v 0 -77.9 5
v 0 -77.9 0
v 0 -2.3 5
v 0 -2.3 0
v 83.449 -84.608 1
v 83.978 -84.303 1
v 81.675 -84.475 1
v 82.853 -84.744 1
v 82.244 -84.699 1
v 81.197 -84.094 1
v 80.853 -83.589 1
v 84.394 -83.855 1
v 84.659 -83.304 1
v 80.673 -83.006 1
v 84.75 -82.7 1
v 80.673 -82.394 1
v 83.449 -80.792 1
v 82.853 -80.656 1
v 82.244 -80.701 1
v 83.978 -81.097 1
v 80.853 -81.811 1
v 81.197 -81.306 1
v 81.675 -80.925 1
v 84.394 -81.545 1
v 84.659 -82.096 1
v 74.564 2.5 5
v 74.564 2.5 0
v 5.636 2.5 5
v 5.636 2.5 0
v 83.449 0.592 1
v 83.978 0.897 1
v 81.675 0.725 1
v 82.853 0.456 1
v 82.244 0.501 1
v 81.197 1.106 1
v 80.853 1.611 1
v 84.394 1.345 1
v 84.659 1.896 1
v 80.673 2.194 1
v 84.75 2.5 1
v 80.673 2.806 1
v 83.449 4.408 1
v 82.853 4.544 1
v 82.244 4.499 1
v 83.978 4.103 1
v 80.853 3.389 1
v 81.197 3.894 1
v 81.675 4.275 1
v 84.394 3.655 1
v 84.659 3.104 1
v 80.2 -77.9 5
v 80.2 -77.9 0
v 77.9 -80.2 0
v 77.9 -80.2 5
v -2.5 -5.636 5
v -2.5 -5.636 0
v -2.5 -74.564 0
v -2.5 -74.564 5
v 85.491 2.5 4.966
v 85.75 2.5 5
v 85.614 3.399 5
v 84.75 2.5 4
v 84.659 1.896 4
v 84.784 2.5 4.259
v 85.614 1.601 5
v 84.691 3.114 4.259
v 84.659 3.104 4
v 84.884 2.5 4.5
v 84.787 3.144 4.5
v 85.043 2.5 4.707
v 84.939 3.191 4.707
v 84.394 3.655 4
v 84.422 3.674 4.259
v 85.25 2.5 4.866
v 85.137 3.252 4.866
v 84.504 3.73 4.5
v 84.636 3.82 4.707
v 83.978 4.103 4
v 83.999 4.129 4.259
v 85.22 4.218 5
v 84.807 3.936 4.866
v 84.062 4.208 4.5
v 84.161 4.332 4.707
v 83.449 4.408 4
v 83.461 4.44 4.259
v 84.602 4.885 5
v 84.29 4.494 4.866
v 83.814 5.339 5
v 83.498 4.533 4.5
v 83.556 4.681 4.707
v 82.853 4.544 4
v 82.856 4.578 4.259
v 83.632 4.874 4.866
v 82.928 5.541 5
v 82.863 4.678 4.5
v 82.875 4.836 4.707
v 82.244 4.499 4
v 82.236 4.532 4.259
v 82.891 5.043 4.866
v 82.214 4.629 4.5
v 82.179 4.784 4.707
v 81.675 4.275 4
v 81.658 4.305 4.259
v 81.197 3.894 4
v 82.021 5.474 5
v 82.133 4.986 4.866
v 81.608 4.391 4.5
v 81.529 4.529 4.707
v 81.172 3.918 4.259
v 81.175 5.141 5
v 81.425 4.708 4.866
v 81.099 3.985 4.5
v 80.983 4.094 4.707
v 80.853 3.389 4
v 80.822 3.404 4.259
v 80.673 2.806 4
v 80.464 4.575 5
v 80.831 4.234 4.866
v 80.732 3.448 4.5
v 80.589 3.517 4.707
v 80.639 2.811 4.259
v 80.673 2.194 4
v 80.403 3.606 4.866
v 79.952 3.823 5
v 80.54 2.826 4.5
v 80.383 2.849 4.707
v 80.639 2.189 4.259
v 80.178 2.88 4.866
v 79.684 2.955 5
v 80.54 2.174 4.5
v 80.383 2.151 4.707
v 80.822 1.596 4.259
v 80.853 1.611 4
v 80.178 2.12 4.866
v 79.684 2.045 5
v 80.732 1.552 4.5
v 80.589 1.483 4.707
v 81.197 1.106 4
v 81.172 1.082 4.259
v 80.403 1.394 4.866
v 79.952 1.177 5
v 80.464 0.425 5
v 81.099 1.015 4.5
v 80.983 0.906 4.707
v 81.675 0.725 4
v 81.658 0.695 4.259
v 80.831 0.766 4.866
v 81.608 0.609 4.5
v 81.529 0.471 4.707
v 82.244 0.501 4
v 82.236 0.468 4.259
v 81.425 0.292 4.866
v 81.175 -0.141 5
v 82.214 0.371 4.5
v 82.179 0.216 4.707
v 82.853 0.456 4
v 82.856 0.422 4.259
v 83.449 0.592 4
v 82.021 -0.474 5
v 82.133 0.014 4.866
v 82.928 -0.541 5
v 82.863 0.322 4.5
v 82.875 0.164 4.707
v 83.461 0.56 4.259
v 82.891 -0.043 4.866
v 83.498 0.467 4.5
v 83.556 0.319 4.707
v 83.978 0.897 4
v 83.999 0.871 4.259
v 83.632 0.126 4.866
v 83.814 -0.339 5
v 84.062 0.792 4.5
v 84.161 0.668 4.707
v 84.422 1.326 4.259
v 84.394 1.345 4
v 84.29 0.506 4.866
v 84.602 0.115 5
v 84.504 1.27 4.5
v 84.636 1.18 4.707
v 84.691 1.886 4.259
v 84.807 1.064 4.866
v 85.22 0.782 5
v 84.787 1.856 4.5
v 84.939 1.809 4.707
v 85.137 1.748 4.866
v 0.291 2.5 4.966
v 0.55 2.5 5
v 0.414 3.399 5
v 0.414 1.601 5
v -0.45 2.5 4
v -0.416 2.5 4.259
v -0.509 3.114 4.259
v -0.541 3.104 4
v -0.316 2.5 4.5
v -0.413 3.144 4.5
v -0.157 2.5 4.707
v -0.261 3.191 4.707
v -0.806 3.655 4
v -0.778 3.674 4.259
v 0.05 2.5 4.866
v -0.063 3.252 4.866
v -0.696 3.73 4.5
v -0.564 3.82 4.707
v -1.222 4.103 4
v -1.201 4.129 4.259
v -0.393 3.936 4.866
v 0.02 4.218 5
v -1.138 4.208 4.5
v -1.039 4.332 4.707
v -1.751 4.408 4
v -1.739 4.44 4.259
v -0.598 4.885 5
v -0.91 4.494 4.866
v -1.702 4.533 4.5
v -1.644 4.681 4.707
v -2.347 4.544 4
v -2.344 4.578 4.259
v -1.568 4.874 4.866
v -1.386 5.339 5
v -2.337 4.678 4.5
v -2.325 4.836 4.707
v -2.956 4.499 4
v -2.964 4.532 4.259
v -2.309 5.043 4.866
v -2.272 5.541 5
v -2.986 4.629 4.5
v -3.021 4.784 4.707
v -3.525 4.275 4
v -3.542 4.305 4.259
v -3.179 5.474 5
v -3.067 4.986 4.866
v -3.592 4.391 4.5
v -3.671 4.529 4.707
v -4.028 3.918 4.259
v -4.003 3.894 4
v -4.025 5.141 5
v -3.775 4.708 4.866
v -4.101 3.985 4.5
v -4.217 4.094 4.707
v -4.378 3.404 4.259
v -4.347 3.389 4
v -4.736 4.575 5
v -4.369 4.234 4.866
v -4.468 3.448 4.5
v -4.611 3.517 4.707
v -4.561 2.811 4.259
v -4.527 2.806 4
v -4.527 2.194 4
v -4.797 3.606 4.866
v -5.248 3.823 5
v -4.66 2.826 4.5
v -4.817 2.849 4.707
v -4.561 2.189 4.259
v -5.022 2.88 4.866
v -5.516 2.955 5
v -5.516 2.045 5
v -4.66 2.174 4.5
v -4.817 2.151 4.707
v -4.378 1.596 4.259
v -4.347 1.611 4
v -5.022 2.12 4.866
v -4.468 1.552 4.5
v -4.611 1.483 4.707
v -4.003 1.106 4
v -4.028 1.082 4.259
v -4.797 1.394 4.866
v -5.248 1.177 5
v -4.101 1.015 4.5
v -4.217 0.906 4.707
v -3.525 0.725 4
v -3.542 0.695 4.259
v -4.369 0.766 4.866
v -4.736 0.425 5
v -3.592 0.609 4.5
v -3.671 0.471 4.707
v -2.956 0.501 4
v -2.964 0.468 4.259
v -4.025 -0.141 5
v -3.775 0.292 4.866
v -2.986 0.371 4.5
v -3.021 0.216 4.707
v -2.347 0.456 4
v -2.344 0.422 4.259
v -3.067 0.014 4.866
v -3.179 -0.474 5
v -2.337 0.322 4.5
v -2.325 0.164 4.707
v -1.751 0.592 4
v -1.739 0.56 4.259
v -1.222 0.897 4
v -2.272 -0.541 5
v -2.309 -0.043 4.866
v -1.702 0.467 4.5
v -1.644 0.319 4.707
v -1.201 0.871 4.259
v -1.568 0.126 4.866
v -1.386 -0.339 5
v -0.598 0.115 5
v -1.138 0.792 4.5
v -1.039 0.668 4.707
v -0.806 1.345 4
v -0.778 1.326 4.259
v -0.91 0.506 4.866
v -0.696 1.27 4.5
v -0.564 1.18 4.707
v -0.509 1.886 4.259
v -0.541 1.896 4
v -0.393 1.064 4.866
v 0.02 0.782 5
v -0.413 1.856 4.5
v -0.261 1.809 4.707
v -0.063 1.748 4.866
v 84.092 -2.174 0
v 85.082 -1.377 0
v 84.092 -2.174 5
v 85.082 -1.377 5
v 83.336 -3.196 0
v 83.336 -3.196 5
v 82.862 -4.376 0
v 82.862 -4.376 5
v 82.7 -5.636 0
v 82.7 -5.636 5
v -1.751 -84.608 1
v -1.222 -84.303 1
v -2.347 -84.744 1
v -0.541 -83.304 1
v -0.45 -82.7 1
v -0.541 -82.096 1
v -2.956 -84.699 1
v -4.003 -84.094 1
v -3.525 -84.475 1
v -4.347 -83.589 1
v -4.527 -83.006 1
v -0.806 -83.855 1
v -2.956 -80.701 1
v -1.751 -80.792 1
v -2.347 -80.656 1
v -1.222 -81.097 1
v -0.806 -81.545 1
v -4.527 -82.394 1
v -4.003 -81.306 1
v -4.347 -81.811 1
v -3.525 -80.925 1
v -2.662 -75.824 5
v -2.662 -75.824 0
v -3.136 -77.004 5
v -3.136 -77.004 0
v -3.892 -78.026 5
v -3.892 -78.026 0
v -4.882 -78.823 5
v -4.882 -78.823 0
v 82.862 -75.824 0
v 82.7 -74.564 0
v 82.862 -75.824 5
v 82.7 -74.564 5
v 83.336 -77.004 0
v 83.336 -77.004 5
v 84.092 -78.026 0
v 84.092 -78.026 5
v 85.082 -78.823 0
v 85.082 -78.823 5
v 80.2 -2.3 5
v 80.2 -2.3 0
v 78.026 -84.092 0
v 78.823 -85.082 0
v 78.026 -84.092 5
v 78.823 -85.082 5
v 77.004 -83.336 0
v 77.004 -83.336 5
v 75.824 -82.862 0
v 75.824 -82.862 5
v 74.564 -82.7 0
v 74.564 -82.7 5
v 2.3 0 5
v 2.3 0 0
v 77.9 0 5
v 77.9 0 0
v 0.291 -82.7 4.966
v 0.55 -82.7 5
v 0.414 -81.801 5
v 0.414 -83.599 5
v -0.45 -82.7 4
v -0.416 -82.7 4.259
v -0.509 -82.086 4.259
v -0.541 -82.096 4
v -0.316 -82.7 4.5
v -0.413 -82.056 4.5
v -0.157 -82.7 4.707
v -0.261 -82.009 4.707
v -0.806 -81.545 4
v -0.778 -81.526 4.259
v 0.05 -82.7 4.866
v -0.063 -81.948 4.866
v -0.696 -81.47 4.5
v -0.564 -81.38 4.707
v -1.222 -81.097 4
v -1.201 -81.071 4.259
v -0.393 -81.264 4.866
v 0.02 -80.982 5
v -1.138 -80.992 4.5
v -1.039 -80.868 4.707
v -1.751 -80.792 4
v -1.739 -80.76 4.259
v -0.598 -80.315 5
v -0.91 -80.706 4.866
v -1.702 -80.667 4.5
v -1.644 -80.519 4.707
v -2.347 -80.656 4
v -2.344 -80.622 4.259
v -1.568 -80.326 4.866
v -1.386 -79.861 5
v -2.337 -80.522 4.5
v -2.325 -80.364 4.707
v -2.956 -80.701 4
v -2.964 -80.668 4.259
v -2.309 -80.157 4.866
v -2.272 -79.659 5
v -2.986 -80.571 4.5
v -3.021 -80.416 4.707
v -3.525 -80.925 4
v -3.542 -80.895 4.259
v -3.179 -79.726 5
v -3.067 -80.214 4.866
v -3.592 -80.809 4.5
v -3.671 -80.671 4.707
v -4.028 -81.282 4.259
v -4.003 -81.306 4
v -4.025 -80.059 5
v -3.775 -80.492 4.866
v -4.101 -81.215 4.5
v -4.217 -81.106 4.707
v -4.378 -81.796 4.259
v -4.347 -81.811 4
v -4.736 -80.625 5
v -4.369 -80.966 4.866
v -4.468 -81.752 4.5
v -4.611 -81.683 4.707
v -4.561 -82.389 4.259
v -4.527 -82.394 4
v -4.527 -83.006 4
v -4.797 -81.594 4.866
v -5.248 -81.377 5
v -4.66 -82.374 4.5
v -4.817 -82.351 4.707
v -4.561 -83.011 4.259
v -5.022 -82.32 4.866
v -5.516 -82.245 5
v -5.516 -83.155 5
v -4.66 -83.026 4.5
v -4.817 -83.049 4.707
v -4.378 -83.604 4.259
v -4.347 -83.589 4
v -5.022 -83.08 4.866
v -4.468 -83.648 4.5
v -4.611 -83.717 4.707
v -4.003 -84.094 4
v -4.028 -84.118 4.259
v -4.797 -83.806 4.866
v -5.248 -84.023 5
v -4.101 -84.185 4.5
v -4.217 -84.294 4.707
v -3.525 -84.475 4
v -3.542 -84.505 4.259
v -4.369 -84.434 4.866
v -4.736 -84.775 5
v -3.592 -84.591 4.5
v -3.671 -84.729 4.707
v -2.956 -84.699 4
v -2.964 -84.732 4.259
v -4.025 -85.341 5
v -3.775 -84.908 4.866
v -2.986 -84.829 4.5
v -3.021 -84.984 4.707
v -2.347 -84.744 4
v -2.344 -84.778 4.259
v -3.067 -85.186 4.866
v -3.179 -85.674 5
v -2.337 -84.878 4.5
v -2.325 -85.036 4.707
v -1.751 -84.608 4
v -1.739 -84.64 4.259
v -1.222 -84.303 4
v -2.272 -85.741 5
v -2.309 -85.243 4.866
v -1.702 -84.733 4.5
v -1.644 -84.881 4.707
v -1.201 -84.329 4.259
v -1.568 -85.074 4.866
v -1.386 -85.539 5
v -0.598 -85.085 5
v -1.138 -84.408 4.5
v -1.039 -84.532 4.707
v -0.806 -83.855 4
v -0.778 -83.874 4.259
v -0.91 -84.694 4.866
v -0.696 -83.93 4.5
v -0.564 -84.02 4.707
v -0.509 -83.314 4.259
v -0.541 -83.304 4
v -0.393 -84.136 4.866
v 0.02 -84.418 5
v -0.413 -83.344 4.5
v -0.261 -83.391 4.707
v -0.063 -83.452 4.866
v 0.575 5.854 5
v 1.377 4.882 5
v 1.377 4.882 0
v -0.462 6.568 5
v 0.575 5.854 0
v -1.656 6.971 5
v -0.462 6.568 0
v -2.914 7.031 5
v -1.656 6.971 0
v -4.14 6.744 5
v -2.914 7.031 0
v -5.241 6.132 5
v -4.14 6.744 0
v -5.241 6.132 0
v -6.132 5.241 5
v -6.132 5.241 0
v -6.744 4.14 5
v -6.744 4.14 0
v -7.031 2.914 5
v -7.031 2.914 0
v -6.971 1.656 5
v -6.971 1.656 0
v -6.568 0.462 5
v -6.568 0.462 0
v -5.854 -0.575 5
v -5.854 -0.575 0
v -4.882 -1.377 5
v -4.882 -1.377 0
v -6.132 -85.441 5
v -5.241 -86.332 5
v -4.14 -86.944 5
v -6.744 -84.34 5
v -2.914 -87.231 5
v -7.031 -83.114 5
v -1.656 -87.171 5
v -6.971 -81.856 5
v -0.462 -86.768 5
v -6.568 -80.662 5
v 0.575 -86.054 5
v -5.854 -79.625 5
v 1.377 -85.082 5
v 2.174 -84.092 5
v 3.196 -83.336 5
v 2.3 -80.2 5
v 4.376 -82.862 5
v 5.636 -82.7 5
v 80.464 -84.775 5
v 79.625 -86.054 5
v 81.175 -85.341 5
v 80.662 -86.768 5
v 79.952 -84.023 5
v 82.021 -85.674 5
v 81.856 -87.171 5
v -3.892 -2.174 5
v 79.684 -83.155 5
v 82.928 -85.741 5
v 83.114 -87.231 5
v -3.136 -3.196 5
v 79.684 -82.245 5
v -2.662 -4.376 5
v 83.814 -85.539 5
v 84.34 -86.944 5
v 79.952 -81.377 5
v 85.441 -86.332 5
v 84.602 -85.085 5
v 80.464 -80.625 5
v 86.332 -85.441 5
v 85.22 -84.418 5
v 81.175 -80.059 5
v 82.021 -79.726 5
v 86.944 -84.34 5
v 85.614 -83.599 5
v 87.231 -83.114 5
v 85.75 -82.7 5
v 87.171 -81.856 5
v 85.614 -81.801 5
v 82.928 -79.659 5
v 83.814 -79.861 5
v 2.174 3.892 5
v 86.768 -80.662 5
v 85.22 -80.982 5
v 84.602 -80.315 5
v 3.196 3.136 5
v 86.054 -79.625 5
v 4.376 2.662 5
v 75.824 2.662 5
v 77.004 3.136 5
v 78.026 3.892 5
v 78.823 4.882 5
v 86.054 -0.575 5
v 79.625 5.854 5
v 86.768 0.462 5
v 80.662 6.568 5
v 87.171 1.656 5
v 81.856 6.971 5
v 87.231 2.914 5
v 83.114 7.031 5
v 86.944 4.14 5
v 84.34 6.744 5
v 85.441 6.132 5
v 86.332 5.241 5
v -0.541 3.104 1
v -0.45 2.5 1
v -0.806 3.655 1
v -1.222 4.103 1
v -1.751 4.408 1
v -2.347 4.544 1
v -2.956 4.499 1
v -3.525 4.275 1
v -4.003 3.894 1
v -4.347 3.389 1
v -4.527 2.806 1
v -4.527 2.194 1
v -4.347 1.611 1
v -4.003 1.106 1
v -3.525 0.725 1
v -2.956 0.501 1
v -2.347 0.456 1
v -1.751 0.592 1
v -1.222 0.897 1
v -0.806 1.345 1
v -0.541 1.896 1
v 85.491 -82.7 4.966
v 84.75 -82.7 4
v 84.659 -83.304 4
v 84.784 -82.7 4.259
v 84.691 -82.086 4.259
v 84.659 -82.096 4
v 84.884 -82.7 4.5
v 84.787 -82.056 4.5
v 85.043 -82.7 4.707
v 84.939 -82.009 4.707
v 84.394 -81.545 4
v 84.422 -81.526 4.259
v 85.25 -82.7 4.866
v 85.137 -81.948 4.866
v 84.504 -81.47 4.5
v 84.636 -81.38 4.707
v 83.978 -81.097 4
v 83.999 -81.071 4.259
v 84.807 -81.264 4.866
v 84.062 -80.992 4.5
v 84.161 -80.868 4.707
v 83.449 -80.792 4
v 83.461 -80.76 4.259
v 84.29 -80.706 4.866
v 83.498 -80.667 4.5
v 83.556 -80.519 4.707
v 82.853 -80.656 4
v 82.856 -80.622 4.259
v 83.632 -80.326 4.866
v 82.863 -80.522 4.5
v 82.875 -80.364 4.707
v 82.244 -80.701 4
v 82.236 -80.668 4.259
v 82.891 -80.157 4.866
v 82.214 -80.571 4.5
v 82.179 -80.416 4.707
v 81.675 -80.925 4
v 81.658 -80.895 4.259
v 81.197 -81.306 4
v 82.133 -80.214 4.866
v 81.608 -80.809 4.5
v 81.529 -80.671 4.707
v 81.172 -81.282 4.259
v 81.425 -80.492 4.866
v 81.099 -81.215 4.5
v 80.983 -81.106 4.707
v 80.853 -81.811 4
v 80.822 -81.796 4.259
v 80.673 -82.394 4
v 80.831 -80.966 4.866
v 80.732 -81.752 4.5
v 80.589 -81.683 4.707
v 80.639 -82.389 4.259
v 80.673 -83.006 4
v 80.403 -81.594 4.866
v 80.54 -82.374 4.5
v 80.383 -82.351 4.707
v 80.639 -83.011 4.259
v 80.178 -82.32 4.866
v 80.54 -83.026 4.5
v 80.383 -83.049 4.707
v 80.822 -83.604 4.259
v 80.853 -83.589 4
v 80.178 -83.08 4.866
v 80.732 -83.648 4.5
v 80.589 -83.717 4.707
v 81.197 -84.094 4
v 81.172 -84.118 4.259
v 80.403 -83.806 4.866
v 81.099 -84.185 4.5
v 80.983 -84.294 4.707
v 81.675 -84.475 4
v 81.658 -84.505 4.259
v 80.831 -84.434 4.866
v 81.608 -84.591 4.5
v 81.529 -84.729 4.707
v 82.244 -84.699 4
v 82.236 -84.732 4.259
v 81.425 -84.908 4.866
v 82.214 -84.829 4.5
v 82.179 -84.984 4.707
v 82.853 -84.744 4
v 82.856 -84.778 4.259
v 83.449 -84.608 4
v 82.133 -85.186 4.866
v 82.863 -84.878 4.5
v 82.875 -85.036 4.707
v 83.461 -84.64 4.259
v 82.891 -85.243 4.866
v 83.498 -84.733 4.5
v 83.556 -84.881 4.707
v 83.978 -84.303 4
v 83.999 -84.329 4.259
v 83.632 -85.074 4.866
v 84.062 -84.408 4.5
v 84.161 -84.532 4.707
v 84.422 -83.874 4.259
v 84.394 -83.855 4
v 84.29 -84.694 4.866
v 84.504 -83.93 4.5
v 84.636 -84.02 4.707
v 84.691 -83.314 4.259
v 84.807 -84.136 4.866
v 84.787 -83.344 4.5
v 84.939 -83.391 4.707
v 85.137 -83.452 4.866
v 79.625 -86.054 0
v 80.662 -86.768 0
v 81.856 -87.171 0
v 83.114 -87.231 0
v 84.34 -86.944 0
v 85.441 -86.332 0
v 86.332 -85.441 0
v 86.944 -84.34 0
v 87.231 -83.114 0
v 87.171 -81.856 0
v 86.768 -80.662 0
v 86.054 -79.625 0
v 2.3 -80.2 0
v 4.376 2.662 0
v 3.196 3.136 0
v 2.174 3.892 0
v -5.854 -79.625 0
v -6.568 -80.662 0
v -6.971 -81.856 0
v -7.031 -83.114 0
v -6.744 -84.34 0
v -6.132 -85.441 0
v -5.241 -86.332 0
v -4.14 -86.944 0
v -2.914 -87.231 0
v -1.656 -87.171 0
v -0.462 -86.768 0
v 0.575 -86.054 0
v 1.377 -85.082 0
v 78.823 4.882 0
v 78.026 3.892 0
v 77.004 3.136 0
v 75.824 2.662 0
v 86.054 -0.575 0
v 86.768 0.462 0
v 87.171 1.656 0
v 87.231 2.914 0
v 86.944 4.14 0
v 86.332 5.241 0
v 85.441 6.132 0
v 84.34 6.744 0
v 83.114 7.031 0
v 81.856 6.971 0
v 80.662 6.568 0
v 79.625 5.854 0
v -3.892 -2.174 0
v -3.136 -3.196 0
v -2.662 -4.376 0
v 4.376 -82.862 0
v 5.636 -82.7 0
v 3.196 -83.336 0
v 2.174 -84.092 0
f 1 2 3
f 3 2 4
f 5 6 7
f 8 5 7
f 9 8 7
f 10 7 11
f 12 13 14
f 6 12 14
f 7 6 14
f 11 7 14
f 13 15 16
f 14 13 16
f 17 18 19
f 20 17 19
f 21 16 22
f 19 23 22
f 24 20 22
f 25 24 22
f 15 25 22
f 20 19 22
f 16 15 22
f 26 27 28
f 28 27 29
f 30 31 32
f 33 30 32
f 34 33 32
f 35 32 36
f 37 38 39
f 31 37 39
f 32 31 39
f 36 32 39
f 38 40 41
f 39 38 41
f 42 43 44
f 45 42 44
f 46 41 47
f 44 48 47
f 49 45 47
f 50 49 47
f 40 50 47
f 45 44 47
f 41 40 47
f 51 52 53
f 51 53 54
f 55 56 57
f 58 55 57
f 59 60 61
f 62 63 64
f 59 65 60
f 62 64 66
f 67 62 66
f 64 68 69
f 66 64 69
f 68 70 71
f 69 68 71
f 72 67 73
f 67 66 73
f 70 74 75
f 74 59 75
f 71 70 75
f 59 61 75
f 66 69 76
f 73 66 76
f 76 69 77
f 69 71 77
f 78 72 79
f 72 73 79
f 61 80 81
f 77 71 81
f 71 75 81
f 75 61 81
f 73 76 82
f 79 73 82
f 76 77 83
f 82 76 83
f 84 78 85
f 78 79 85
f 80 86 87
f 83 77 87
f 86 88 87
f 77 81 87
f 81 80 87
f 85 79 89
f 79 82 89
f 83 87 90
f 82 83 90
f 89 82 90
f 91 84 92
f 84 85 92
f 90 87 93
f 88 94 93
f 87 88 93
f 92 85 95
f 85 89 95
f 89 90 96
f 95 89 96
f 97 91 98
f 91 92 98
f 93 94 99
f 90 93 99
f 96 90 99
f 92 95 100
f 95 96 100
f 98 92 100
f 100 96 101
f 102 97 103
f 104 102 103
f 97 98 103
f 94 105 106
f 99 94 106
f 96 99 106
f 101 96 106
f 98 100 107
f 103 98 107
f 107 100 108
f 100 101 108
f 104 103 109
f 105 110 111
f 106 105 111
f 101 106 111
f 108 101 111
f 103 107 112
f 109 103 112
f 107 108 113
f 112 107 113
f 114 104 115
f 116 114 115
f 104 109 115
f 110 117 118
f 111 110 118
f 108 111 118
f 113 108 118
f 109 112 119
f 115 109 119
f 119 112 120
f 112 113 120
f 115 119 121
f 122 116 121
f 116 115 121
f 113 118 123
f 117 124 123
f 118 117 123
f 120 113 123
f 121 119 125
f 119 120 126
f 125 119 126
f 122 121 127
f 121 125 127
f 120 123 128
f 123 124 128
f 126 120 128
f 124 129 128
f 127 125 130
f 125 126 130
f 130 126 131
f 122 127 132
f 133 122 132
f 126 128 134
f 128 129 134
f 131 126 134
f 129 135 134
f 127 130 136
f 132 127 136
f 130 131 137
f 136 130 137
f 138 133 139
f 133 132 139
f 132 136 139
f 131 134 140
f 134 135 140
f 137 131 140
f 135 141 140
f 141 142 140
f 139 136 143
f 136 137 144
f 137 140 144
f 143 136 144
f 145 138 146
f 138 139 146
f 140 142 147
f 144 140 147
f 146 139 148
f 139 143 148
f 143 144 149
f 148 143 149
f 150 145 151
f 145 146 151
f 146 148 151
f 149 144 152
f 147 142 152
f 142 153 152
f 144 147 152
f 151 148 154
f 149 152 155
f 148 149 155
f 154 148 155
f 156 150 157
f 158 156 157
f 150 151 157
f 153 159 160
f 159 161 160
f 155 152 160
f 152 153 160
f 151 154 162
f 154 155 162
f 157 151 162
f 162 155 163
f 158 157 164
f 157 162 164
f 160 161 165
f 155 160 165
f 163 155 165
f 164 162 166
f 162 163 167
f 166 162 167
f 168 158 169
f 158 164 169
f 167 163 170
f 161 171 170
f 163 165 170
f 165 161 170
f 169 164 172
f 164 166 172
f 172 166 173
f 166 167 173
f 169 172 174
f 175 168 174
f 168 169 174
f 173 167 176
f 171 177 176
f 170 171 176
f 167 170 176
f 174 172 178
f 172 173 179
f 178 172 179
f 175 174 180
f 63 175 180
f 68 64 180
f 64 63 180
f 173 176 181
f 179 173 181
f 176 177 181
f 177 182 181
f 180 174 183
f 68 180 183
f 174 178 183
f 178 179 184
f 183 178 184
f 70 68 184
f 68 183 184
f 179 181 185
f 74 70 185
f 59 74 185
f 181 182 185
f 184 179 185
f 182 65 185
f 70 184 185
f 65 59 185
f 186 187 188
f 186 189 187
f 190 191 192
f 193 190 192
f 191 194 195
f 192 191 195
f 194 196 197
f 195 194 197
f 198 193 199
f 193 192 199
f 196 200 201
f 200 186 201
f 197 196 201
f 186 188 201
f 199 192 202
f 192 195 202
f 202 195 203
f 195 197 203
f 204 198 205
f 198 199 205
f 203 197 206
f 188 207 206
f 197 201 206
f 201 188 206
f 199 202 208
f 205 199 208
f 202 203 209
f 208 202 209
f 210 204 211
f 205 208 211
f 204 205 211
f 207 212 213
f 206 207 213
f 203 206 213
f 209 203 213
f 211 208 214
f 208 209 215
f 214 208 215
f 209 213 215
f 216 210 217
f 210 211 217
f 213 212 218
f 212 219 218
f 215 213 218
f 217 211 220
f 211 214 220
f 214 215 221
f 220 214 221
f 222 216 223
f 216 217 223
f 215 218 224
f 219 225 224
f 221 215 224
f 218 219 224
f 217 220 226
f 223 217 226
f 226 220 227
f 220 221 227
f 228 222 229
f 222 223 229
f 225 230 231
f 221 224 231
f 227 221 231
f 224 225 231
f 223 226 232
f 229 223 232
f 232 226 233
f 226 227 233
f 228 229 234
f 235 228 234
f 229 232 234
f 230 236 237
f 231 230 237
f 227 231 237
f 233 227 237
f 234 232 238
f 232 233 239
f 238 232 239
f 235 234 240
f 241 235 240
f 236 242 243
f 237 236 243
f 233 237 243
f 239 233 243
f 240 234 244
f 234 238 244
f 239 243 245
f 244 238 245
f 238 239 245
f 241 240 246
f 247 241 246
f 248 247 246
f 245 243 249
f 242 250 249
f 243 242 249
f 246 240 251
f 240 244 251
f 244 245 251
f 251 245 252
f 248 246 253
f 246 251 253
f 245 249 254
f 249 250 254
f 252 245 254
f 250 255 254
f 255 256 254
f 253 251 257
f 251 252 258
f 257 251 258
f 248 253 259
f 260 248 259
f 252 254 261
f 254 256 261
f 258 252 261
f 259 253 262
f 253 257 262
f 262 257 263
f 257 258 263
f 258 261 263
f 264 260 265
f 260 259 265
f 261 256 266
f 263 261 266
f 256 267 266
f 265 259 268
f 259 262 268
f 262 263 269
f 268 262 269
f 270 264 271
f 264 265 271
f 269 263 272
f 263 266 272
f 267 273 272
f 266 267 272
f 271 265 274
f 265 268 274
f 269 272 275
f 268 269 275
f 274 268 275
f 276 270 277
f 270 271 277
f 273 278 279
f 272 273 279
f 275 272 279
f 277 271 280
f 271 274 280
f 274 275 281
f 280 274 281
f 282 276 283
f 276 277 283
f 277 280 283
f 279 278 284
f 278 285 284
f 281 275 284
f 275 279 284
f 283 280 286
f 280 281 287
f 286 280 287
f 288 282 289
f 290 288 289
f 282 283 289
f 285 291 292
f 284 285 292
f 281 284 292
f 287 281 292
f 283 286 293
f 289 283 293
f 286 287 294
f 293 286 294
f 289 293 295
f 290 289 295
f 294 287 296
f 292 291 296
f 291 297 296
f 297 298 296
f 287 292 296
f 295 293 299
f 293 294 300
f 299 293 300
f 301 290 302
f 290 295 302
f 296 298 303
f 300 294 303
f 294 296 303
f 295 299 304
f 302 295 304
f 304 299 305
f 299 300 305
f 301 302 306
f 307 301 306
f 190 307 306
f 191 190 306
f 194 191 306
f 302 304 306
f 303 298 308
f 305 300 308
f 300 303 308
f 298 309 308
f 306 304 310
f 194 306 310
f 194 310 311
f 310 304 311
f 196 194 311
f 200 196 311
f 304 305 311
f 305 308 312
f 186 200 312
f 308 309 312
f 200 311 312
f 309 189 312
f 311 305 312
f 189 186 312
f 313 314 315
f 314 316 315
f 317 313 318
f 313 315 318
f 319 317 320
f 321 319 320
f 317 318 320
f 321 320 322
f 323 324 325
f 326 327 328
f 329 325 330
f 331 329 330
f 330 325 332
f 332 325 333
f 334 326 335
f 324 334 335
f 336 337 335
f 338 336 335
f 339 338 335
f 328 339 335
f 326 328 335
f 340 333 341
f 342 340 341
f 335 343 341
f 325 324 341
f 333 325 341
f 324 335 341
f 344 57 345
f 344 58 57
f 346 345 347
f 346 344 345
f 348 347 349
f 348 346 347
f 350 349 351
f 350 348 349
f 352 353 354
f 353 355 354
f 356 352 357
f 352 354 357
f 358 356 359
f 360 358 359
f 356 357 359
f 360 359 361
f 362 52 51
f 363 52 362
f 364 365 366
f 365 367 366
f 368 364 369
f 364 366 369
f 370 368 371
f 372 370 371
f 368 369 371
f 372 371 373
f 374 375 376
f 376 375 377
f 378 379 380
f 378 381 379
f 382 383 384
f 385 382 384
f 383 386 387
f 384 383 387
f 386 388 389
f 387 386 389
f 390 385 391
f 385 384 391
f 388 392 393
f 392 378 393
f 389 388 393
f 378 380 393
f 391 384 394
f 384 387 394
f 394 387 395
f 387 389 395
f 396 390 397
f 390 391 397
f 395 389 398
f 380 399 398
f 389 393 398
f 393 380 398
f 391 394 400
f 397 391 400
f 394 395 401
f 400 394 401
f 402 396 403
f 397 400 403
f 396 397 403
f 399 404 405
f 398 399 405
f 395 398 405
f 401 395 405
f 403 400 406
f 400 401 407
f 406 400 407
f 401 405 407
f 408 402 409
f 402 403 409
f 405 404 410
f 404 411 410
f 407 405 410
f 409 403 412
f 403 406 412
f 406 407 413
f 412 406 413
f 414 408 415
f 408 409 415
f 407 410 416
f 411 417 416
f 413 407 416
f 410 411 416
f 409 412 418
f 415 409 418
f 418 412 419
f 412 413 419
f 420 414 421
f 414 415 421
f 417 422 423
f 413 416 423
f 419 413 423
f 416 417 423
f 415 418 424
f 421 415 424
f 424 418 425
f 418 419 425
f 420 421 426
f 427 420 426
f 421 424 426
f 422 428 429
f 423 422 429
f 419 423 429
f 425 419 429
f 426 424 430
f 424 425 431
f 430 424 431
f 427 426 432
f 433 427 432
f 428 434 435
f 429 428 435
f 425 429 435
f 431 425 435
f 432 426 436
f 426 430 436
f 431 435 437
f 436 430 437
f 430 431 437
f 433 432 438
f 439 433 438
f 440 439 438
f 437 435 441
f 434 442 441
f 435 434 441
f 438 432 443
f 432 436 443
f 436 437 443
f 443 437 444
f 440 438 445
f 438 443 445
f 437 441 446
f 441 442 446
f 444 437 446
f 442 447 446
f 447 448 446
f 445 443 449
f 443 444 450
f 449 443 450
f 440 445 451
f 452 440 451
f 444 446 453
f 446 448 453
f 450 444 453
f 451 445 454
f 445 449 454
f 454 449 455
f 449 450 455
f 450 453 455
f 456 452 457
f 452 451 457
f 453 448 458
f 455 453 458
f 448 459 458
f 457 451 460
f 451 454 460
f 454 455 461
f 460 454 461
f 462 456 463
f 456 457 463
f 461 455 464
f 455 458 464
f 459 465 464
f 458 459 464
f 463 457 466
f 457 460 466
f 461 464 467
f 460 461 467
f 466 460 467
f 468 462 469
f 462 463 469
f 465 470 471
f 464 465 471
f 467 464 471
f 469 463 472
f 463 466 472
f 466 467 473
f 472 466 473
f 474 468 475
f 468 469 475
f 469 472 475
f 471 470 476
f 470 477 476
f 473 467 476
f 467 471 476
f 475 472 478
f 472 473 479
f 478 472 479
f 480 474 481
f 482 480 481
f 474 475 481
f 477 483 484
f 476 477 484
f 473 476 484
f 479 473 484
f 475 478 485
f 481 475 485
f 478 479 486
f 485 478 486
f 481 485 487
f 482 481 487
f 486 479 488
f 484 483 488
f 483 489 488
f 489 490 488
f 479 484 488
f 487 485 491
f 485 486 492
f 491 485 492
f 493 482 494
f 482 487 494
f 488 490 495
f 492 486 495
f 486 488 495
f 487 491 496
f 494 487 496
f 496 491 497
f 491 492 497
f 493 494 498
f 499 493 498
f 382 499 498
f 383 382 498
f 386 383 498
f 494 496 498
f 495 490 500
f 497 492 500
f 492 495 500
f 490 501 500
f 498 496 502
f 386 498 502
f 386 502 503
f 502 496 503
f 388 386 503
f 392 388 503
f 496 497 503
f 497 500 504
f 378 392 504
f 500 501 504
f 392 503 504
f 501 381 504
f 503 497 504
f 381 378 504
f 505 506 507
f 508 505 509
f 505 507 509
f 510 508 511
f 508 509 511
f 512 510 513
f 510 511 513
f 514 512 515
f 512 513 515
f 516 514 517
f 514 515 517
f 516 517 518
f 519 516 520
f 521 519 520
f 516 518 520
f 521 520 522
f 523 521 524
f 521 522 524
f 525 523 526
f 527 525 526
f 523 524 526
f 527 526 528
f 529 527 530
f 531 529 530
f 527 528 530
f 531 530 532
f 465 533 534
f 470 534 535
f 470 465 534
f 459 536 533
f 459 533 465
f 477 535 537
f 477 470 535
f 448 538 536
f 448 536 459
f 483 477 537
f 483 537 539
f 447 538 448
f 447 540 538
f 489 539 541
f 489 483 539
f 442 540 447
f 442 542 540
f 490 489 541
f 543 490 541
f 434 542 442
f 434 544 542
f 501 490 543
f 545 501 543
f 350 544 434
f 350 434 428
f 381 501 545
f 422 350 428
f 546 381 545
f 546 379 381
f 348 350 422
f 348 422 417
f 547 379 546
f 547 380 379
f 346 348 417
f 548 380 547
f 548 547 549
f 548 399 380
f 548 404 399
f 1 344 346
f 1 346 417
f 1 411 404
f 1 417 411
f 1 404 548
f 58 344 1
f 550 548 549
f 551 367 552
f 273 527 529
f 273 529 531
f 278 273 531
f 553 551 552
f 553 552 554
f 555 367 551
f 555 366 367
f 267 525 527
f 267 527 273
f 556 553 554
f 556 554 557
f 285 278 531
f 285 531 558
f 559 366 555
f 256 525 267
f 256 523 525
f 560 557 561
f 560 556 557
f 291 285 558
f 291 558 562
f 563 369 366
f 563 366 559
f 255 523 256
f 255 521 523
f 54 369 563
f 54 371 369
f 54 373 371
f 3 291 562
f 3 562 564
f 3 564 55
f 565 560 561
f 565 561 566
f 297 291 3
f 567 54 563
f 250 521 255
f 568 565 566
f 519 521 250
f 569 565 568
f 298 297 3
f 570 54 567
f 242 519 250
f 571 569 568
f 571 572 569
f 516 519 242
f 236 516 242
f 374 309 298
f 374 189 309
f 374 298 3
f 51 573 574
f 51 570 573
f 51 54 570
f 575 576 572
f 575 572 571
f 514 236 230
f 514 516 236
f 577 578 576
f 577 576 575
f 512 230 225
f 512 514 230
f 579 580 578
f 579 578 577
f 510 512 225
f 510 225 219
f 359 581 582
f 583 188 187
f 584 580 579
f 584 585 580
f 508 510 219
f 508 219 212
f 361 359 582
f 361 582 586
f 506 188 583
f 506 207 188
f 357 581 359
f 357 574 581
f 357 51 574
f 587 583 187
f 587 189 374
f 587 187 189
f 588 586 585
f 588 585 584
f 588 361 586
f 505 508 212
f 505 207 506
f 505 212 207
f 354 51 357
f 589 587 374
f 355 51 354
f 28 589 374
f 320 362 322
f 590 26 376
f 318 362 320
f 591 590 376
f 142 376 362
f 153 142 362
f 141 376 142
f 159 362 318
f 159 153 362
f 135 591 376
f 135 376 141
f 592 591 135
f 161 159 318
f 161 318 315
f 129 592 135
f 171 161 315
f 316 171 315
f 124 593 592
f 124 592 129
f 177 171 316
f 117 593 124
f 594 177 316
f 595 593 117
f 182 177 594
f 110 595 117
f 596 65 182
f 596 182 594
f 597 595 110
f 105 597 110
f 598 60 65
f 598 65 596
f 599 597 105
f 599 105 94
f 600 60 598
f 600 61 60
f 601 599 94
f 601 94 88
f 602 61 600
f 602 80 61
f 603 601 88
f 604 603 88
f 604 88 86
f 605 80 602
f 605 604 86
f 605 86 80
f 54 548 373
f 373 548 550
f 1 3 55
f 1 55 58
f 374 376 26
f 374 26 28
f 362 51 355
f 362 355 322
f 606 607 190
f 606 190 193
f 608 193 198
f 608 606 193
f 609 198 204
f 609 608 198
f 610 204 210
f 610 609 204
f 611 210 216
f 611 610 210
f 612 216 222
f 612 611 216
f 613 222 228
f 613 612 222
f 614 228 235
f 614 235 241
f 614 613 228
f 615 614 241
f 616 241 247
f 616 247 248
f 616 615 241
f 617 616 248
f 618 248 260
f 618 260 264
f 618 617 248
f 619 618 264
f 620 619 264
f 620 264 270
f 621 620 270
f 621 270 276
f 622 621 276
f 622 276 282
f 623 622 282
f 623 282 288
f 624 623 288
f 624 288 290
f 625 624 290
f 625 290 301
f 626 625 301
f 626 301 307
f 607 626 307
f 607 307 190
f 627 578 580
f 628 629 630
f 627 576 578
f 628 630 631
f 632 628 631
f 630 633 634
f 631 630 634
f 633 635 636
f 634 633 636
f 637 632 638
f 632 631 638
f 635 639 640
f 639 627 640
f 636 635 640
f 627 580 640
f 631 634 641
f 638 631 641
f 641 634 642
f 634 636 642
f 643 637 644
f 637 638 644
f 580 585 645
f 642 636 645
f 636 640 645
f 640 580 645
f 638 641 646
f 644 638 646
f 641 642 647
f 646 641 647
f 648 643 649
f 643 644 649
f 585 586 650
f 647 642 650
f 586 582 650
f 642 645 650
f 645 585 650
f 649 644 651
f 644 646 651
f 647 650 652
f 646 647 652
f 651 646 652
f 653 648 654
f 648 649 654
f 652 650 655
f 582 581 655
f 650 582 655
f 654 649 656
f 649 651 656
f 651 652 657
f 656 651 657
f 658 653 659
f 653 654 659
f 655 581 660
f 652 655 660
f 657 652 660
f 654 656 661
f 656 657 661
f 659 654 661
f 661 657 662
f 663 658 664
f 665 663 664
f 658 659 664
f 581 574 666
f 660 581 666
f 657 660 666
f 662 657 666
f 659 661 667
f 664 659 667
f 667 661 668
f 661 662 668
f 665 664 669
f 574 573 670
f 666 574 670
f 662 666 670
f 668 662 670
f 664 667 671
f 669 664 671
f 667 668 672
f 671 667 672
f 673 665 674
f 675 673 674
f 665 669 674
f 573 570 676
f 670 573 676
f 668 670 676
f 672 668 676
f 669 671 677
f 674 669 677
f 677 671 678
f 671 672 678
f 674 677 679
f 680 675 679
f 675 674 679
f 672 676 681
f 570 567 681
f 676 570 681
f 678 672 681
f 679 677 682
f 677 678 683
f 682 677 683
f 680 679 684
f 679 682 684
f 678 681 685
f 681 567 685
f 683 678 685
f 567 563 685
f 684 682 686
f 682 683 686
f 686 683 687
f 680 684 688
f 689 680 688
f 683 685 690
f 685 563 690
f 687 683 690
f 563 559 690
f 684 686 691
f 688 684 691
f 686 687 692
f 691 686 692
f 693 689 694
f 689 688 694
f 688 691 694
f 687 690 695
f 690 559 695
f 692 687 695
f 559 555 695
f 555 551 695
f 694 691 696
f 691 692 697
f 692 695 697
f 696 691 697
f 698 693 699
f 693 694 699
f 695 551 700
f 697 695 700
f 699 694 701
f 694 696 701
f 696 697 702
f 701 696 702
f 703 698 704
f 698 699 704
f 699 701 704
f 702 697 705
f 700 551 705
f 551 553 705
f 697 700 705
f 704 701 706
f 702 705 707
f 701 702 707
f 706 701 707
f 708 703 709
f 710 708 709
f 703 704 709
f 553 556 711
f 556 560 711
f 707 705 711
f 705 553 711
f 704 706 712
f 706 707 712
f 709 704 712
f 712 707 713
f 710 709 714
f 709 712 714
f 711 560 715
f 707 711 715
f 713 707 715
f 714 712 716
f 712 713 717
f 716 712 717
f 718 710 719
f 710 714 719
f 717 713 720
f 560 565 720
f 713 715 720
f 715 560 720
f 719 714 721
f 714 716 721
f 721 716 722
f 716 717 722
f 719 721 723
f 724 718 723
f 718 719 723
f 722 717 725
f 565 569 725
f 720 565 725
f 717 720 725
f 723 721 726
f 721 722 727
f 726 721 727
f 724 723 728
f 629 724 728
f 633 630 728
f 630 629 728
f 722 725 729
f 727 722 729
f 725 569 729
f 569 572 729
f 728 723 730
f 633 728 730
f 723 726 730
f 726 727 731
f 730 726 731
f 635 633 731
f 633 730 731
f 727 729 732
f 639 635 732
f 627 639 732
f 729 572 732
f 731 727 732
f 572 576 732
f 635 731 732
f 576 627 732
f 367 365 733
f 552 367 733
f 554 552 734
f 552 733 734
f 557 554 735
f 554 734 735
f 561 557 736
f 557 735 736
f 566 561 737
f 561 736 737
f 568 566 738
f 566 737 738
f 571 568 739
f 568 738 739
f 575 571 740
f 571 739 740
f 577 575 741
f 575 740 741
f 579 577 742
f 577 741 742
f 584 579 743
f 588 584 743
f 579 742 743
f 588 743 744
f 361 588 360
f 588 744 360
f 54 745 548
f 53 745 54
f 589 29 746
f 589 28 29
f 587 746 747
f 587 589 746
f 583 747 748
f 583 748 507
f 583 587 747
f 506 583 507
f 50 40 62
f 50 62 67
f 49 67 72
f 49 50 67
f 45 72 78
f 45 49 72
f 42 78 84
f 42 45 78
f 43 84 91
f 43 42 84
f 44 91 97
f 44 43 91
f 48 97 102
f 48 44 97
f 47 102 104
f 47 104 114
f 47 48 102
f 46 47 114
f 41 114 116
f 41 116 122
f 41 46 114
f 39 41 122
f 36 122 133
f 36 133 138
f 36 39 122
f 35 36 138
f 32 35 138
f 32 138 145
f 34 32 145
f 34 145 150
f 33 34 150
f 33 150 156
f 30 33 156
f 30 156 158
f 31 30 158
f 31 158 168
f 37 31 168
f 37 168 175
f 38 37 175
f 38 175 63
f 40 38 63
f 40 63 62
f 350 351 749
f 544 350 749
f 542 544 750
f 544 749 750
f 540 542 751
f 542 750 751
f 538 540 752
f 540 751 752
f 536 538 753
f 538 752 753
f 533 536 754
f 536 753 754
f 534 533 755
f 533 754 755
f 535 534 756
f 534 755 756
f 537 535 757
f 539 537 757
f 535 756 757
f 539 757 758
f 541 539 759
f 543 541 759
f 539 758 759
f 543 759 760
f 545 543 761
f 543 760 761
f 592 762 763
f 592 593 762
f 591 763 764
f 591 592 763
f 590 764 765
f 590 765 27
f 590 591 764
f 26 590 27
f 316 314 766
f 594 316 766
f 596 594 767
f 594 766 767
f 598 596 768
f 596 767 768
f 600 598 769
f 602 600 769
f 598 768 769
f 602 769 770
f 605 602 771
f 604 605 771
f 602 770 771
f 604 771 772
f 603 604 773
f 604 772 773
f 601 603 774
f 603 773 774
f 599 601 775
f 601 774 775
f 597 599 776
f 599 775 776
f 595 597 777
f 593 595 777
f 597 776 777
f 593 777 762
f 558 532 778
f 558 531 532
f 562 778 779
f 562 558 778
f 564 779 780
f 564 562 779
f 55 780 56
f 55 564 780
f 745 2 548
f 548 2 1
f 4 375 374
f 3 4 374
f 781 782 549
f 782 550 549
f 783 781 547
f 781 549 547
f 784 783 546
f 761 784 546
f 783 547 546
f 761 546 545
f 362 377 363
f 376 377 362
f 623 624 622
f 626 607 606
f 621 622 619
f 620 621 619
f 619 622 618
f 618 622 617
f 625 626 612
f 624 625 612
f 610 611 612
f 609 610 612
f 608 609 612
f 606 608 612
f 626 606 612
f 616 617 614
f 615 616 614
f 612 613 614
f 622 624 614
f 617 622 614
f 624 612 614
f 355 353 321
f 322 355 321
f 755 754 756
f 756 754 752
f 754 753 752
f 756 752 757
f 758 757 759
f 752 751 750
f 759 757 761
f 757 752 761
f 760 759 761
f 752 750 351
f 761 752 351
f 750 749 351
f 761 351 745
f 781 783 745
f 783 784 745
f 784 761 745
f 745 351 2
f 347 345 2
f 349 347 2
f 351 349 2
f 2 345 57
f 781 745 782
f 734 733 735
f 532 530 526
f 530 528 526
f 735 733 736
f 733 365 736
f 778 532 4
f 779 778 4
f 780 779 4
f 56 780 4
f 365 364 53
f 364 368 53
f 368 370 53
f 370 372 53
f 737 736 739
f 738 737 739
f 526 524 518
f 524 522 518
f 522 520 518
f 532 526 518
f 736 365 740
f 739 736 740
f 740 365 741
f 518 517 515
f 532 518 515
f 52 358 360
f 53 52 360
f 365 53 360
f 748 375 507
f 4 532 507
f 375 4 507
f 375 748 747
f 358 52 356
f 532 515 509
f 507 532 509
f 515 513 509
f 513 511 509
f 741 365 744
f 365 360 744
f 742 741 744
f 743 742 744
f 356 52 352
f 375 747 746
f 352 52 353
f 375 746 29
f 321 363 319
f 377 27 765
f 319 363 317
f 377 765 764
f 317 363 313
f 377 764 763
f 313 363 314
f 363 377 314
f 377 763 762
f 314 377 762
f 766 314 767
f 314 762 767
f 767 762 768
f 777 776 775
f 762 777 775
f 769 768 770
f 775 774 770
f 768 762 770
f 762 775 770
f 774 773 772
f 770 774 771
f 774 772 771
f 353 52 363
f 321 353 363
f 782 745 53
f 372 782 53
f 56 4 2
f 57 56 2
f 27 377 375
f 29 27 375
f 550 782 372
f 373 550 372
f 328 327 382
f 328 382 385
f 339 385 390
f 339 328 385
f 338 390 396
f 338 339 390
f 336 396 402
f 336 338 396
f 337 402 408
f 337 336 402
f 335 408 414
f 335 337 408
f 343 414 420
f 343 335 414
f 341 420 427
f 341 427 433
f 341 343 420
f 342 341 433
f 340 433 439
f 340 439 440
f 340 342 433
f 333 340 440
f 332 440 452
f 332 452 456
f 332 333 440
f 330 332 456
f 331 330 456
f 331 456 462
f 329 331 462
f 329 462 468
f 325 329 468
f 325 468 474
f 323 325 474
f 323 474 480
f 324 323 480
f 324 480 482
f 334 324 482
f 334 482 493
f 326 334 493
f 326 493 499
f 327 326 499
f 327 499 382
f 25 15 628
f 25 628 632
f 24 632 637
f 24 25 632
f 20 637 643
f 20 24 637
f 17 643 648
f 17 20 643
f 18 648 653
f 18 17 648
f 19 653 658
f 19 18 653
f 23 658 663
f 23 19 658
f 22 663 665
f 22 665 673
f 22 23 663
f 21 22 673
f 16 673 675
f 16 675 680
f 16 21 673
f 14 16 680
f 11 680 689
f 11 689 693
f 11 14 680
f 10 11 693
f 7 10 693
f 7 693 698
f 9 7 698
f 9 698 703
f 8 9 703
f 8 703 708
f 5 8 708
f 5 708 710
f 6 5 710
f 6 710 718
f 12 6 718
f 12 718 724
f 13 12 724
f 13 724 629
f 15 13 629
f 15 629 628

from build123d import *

# Parameters (mm, degrees)
SKETCH1_W           = 80.2
SKETCH1_H           = 80.2
SKETCH1_R           = 2.05
BOSS_EXTRUDE1_DEPTH = 5
CHAMFER1_SIZE       = 2.3
FILLET1_R           = 5
FILLET2_R           = 1
SKETCH2_R           = 4.55
BOSS_EXTRUDE2_DEPTH = 1


with BuildPart() as part:
    # Sketch1 → Boss-Extrude1 (new body)
    with BuildSketch(Plane.XY):
        with BuildLine():
            ThreePointArc((82.7, -2.05), (85.917335854, 5.717335854), (78.15, 2.5))
            Line((78.15, 2.5), (2.05, 2.5))
            ThreePointArc((2.05, 2.5), (-5.717335854, 5.717335854), (-2.5, -2.05))
            Line((-2.5, -2.05), (-2.5, -78.15))
            ThreePointArc((-2.5, -78.15), (-5.717335854, -85.917335854), (2.05, -82.7))
            Line((2.05, -82.7), (78.15, -82.7))
            ThreePointArc((78.15, -82.7), (85.917335854, -85.917335854), (82.7, -78.15))
            Line((82.7, -78.15), (82.7, -2.05))
        make_face()
        with Locations((40.1, -40.1)):
            Rectangle(SKETCH1_W, SKETCH1_H, mode=Mode.SUBTRACT)
        with Locations((82.7, -82.7)):
            Circle(SKETCH1_R, mode=Mode.SUBTRACT)
        with Locations((-2.5, -82.7)):
            Circle(SKETCH1_R, mode=Mode.SUBTRACT)
        with Locations((82.7, 2.5)):
            Circle(SKETCH1_R, mode=Mode.SUBTRACT)
        with Locations((-2.5, 2.5)):
            Circle(SKETCH1_R, mode=Mode.SUBTRACT)
    extrude(amount=BOSS_EXTRUDE1_DEPTH)

    # Chamfer1
    chamfer1_edges = [part.edges().sort_by_distance(p)[0] for p in [
        (0, 0, 2.5),
        (0, -80.2, 2.5),
        (80.2, -80.2, 2.5),
        (80.2, 0, 2.5),
    ]]
    chamfer(chamfer1_edges, length=CHAMFER1_SIZE)

    # Fillet1
    fillet1_edges = [part.edges().sort_by_distance(p)[0] for p in [
        (2.05, 2.5, 2.5),
        (78.15, 2.5, 2.5),
        (82.7, -2.05, 2.5),
        (82.7, -78.15, 2.5),
        (78.15, -82.7, 2.5),
        (2.05, -82.7, 2.5),
        (-2.5, -78.15, 2.5),
        (-2.5, -2.05, 2.5),
    ]]
    fillet(fillet1_edges, radius=FILLET1_R)

    # Fillet2
    fillet2_edges = [part.edges().sort_by_distance(p)[0] for p in [
        (80.65, 2.5, 5),
        (80.65, -82.7, 5),
        (-4.55, 2.5, 5),
        (-4.55, -82.7, 5),
    ]]
    fillet(fillet2_edges, radius=FILLET2_R)

    # Sketch2 → Boss-Extrude2 (add)
    with BuildSketch(Plane(origin=(0, 0, 0), x_dir=(-1, 0, 0), z_dir=(0, 0, -1))):
        with Locations((-82.7, 2.5)):
            Circle(SKETCH2_R)
        with Locations((2.5, 2.5)):
            Circle(SKETCH2_R)
        with Locations((2.5, -82.7)):
            Circle(SKETCH2_R)
        with Locations((-82.7, -82.7)):
            Circle(SKETCH2_R)
    extrude(amount=-BOSS_EXTRUDE2_DEPTH)


solid = part.part
